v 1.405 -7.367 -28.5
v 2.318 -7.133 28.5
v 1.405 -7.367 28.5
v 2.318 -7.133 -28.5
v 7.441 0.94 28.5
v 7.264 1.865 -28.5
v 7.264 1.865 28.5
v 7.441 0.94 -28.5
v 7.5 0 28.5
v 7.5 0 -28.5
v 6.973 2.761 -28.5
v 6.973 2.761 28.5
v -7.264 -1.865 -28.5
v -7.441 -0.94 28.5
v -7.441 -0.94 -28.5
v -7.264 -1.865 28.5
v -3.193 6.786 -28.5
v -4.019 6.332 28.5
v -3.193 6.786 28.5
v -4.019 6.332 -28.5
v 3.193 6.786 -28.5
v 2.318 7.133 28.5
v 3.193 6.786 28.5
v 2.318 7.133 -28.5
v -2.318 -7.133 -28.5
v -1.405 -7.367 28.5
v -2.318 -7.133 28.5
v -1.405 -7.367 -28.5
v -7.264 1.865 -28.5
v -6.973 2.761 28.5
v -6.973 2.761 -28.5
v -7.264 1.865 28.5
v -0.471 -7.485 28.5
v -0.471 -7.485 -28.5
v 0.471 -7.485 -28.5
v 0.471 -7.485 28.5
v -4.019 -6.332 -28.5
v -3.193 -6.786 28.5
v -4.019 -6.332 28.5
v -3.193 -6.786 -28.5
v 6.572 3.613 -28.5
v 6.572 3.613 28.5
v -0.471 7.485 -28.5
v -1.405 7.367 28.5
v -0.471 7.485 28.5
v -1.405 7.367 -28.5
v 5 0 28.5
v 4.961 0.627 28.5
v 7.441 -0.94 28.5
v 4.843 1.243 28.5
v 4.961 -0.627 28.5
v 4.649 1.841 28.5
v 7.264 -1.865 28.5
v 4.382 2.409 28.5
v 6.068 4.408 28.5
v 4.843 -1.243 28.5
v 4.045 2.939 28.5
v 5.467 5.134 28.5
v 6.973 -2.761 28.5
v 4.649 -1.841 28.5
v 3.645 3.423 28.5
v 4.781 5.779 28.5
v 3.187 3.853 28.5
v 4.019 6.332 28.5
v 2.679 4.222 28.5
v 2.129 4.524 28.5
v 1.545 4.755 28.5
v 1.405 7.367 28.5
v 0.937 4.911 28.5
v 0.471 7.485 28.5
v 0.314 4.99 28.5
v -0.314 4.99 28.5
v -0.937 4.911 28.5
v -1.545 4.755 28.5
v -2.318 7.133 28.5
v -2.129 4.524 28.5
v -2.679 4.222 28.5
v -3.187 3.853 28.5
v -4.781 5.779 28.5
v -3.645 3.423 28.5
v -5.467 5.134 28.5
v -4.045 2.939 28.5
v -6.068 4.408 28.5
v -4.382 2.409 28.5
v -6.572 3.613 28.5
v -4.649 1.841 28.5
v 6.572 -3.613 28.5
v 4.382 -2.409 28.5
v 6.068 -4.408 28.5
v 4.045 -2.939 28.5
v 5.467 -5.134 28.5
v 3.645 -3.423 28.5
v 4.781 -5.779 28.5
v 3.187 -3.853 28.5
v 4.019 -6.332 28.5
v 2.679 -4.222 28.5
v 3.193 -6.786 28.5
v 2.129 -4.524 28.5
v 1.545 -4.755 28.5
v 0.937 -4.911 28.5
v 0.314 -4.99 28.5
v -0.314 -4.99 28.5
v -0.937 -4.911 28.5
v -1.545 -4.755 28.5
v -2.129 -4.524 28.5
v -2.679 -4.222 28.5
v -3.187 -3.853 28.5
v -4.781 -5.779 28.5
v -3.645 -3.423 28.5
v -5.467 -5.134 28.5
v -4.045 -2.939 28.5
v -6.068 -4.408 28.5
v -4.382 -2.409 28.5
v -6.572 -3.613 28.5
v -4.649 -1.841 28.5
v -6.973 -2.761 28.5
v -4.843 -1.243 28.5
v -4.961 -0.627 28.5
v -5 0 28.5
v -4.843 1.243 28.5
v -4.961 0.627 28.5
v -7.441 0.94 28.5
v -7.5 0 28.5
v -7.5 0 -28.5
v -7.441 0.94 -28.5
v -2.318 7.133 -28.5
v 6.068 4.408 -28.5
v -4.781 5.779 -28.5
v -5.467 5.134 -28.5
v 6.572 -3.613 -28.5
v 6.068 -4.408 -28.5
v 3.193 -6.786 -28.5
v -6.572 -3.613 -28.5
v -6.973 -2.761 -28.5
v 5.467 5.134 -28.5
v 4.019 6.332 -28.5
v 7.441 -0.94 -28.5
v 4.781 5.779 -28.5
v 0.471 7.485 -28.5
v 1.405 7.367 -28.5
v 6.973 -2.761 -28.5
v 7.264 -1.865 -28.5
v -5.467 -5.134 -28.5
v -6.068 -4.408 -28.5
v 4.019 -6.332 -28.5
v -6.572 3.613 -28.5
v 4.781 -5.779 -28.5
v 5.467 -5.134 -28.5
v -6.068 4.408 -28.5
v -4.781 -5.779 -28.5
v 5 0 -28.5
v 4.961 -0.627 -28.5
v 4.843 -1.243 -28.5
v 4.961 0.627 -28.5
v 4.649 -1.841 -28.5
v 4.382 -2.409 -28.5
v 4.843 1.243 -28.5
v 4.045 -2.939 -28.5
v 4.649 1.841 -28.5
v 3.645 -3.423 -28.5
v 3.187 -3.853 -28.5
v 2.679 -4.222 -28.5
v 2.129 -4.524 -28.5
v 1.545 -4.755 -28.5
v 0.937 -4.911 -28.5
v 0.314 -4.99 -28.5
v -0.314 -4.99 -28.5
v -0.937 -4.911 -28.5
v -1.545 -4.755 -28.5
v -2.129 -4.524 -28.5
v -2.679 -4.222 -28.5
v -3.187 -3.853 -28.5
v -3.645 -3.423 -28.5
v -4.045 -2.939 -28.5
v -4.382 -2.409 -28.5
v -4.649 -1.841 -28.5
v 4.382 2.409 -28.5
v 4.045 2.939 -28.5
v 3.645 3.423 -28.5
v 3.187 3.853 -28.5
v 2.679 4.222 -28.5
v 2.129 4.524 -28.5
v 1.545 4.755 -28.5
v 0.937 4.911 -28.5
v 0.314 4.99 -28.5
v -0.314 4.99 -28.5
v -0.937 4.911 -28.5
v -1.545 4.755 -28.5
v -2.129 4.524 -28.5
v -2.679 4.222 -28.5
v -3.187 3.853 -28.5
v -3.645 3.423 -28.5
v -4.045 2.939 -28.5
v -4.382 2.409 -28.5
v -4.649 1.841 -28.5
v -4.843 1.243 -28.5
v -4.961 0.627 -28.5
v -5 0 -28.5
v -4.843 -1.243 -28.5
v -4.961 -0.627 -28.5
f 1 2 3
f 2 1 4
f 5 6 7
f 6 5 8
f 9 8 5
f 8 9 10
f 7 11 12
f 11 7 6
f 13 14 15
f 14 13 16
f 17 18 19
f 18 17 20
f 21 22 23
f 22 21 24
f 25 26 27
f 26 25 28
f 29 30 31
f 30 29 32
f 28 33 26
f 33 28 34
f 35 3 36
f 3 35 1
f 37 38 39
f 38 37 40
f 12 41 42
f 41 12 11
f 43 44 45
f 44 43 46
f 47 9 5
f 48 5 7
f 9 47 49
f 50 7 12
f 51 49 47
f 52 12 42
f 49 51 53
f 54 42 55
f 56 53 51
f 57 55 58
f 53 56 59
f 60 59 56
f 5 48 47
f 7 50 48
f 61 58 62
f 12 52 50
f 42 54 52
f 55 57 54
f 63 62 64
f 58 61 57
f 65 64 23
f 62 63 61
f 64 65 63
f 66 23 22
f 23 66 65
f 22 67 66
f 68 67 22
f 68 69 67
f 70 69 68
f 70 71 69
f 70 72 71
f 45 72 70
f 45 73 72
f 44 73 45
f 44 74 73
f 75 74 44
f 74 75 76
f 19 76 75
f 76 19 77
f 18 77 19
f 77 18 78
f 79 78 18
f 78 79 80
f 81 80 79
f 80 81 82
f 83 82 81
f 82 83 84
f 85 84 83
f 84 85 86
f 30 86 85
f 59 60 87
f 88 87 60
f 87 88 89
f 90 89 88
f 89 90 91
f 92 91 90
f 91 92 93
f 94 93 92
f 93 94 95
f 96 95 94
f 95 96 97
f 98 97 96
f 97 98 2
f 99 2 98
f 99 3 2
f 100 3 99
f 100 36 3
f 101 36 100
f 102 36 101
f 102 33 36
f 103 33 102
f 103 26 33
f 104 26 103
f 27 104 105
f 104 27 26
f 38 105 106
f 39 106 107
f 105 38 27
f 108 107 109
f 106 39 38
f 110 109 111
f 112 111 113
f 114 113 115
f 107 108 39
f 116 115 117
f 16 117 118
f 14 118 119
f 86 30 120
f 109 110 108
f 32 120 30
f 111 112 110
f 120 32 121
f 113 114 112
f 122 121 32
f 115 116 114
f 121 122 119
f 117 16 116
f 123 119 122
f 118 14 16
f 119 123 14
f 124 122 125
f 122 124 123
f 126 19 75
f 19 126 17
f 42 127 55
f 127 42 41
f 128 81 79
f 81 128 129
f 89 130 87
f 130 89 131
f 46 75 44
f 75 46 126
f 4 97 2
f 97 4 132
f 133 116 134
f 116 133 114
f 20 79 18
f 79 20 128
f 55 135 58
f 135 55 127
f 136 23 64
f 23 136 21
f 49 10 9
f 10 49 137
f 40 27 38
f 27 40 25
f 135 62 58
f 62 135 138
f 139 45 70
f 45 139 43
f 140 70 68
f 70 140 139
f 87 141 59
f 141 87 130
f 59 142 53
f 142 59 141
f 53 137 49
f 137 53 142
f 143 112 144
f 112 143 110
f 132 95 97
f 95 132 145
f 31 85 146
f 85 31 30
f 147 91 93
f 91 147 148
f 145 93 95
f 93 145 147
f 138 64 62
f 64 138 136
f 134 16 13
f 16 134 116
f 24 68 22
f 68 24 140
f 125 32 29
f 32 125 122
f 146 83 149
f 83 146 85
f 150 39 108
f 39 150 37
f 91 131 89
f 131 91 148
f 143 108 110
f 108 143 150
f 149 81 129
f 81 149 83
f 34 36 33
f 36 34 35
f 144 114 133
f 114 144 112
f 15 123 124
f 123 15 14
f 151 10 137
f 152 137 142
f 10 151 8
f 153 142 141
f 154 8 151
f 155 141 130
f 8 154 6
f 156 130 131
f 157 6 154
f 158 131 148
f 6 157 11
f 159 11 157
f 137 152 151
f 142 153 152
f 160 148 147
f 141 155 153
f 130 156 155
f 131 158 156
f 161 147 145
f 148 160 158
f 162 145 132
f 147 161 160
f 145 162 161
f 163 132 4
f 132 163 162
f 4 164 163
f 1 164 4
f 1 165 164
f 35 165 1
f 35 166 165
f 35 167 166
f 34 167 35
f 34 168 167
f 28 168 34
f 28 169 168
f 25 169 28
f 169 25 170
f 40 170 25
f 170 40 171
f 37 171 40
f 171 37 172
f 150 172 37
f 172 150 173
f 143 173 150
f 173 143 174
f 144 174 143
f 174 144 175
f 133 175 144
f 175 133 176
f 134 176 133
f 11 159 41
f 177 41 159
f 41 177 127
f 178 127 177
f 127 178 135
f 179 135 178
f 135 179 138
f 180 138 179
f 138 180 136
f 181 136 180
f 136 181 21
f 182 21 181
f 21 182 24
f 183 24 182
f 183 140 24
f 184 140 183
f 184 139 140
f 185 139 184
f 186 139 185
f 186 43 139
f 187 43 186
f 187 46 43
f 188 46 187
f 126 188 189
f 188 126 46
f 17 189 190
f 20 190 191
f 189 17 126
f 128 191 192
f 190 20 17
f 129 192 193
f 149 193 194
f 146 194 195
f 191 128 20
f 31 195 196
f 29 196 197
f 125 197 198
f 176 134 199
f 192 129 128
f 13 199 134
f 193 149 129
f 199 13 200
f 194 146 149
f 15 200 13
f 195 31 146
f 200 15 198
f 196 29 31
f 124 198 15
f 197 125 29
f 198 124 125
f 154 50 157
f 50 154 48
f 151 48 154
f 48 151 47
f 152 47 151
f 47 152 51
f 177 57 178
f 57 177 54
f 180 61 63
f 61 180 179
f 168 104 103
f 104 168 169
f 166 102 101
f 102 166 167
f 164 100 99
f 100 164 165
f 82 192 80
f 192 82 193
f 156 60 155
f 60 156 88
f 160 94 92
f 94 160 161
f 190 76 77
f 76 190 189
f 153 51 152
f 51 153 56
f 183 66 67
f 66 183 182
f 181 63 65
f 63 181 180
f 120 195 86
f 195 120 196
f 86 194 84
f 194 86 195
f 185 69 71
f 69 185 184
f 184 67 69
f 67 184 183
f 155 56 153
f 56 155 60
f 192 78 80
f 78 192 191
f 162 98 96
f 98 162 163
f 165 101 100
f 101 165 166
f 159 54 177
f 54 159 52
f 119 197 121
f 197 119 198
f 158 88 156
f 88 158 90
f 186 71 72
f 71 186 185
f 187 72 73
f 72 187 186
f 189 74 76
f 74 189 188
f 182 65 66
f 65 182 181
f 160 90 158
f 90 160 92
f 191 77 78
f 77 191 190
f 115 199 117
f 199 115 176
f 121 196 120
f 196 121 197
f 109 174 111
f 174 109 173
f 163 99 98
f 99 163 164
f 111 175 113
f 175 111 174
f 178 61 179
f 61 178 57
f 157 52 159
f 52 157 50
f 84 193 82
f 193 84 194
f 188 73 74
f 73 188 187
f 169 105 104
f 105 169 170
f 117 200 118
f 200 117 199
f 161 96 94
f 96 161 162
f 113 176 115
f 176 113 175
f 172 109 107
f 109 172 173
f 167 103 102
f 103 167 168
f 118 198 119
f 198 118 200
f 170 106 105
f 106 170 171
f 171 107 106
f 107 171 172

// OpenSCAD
$fn = 50;


difference() {
	union() {
		translate(v = [0, 0, -28.5000000000]) {
			cylinder(h = 57, r = 7.5000000000);
		}
	}
	union() {
		translate(v = [0, 0, -100.0000000000]) {
			cylinder(h = 200, r = 5.0000000000);
		}
	}
}
